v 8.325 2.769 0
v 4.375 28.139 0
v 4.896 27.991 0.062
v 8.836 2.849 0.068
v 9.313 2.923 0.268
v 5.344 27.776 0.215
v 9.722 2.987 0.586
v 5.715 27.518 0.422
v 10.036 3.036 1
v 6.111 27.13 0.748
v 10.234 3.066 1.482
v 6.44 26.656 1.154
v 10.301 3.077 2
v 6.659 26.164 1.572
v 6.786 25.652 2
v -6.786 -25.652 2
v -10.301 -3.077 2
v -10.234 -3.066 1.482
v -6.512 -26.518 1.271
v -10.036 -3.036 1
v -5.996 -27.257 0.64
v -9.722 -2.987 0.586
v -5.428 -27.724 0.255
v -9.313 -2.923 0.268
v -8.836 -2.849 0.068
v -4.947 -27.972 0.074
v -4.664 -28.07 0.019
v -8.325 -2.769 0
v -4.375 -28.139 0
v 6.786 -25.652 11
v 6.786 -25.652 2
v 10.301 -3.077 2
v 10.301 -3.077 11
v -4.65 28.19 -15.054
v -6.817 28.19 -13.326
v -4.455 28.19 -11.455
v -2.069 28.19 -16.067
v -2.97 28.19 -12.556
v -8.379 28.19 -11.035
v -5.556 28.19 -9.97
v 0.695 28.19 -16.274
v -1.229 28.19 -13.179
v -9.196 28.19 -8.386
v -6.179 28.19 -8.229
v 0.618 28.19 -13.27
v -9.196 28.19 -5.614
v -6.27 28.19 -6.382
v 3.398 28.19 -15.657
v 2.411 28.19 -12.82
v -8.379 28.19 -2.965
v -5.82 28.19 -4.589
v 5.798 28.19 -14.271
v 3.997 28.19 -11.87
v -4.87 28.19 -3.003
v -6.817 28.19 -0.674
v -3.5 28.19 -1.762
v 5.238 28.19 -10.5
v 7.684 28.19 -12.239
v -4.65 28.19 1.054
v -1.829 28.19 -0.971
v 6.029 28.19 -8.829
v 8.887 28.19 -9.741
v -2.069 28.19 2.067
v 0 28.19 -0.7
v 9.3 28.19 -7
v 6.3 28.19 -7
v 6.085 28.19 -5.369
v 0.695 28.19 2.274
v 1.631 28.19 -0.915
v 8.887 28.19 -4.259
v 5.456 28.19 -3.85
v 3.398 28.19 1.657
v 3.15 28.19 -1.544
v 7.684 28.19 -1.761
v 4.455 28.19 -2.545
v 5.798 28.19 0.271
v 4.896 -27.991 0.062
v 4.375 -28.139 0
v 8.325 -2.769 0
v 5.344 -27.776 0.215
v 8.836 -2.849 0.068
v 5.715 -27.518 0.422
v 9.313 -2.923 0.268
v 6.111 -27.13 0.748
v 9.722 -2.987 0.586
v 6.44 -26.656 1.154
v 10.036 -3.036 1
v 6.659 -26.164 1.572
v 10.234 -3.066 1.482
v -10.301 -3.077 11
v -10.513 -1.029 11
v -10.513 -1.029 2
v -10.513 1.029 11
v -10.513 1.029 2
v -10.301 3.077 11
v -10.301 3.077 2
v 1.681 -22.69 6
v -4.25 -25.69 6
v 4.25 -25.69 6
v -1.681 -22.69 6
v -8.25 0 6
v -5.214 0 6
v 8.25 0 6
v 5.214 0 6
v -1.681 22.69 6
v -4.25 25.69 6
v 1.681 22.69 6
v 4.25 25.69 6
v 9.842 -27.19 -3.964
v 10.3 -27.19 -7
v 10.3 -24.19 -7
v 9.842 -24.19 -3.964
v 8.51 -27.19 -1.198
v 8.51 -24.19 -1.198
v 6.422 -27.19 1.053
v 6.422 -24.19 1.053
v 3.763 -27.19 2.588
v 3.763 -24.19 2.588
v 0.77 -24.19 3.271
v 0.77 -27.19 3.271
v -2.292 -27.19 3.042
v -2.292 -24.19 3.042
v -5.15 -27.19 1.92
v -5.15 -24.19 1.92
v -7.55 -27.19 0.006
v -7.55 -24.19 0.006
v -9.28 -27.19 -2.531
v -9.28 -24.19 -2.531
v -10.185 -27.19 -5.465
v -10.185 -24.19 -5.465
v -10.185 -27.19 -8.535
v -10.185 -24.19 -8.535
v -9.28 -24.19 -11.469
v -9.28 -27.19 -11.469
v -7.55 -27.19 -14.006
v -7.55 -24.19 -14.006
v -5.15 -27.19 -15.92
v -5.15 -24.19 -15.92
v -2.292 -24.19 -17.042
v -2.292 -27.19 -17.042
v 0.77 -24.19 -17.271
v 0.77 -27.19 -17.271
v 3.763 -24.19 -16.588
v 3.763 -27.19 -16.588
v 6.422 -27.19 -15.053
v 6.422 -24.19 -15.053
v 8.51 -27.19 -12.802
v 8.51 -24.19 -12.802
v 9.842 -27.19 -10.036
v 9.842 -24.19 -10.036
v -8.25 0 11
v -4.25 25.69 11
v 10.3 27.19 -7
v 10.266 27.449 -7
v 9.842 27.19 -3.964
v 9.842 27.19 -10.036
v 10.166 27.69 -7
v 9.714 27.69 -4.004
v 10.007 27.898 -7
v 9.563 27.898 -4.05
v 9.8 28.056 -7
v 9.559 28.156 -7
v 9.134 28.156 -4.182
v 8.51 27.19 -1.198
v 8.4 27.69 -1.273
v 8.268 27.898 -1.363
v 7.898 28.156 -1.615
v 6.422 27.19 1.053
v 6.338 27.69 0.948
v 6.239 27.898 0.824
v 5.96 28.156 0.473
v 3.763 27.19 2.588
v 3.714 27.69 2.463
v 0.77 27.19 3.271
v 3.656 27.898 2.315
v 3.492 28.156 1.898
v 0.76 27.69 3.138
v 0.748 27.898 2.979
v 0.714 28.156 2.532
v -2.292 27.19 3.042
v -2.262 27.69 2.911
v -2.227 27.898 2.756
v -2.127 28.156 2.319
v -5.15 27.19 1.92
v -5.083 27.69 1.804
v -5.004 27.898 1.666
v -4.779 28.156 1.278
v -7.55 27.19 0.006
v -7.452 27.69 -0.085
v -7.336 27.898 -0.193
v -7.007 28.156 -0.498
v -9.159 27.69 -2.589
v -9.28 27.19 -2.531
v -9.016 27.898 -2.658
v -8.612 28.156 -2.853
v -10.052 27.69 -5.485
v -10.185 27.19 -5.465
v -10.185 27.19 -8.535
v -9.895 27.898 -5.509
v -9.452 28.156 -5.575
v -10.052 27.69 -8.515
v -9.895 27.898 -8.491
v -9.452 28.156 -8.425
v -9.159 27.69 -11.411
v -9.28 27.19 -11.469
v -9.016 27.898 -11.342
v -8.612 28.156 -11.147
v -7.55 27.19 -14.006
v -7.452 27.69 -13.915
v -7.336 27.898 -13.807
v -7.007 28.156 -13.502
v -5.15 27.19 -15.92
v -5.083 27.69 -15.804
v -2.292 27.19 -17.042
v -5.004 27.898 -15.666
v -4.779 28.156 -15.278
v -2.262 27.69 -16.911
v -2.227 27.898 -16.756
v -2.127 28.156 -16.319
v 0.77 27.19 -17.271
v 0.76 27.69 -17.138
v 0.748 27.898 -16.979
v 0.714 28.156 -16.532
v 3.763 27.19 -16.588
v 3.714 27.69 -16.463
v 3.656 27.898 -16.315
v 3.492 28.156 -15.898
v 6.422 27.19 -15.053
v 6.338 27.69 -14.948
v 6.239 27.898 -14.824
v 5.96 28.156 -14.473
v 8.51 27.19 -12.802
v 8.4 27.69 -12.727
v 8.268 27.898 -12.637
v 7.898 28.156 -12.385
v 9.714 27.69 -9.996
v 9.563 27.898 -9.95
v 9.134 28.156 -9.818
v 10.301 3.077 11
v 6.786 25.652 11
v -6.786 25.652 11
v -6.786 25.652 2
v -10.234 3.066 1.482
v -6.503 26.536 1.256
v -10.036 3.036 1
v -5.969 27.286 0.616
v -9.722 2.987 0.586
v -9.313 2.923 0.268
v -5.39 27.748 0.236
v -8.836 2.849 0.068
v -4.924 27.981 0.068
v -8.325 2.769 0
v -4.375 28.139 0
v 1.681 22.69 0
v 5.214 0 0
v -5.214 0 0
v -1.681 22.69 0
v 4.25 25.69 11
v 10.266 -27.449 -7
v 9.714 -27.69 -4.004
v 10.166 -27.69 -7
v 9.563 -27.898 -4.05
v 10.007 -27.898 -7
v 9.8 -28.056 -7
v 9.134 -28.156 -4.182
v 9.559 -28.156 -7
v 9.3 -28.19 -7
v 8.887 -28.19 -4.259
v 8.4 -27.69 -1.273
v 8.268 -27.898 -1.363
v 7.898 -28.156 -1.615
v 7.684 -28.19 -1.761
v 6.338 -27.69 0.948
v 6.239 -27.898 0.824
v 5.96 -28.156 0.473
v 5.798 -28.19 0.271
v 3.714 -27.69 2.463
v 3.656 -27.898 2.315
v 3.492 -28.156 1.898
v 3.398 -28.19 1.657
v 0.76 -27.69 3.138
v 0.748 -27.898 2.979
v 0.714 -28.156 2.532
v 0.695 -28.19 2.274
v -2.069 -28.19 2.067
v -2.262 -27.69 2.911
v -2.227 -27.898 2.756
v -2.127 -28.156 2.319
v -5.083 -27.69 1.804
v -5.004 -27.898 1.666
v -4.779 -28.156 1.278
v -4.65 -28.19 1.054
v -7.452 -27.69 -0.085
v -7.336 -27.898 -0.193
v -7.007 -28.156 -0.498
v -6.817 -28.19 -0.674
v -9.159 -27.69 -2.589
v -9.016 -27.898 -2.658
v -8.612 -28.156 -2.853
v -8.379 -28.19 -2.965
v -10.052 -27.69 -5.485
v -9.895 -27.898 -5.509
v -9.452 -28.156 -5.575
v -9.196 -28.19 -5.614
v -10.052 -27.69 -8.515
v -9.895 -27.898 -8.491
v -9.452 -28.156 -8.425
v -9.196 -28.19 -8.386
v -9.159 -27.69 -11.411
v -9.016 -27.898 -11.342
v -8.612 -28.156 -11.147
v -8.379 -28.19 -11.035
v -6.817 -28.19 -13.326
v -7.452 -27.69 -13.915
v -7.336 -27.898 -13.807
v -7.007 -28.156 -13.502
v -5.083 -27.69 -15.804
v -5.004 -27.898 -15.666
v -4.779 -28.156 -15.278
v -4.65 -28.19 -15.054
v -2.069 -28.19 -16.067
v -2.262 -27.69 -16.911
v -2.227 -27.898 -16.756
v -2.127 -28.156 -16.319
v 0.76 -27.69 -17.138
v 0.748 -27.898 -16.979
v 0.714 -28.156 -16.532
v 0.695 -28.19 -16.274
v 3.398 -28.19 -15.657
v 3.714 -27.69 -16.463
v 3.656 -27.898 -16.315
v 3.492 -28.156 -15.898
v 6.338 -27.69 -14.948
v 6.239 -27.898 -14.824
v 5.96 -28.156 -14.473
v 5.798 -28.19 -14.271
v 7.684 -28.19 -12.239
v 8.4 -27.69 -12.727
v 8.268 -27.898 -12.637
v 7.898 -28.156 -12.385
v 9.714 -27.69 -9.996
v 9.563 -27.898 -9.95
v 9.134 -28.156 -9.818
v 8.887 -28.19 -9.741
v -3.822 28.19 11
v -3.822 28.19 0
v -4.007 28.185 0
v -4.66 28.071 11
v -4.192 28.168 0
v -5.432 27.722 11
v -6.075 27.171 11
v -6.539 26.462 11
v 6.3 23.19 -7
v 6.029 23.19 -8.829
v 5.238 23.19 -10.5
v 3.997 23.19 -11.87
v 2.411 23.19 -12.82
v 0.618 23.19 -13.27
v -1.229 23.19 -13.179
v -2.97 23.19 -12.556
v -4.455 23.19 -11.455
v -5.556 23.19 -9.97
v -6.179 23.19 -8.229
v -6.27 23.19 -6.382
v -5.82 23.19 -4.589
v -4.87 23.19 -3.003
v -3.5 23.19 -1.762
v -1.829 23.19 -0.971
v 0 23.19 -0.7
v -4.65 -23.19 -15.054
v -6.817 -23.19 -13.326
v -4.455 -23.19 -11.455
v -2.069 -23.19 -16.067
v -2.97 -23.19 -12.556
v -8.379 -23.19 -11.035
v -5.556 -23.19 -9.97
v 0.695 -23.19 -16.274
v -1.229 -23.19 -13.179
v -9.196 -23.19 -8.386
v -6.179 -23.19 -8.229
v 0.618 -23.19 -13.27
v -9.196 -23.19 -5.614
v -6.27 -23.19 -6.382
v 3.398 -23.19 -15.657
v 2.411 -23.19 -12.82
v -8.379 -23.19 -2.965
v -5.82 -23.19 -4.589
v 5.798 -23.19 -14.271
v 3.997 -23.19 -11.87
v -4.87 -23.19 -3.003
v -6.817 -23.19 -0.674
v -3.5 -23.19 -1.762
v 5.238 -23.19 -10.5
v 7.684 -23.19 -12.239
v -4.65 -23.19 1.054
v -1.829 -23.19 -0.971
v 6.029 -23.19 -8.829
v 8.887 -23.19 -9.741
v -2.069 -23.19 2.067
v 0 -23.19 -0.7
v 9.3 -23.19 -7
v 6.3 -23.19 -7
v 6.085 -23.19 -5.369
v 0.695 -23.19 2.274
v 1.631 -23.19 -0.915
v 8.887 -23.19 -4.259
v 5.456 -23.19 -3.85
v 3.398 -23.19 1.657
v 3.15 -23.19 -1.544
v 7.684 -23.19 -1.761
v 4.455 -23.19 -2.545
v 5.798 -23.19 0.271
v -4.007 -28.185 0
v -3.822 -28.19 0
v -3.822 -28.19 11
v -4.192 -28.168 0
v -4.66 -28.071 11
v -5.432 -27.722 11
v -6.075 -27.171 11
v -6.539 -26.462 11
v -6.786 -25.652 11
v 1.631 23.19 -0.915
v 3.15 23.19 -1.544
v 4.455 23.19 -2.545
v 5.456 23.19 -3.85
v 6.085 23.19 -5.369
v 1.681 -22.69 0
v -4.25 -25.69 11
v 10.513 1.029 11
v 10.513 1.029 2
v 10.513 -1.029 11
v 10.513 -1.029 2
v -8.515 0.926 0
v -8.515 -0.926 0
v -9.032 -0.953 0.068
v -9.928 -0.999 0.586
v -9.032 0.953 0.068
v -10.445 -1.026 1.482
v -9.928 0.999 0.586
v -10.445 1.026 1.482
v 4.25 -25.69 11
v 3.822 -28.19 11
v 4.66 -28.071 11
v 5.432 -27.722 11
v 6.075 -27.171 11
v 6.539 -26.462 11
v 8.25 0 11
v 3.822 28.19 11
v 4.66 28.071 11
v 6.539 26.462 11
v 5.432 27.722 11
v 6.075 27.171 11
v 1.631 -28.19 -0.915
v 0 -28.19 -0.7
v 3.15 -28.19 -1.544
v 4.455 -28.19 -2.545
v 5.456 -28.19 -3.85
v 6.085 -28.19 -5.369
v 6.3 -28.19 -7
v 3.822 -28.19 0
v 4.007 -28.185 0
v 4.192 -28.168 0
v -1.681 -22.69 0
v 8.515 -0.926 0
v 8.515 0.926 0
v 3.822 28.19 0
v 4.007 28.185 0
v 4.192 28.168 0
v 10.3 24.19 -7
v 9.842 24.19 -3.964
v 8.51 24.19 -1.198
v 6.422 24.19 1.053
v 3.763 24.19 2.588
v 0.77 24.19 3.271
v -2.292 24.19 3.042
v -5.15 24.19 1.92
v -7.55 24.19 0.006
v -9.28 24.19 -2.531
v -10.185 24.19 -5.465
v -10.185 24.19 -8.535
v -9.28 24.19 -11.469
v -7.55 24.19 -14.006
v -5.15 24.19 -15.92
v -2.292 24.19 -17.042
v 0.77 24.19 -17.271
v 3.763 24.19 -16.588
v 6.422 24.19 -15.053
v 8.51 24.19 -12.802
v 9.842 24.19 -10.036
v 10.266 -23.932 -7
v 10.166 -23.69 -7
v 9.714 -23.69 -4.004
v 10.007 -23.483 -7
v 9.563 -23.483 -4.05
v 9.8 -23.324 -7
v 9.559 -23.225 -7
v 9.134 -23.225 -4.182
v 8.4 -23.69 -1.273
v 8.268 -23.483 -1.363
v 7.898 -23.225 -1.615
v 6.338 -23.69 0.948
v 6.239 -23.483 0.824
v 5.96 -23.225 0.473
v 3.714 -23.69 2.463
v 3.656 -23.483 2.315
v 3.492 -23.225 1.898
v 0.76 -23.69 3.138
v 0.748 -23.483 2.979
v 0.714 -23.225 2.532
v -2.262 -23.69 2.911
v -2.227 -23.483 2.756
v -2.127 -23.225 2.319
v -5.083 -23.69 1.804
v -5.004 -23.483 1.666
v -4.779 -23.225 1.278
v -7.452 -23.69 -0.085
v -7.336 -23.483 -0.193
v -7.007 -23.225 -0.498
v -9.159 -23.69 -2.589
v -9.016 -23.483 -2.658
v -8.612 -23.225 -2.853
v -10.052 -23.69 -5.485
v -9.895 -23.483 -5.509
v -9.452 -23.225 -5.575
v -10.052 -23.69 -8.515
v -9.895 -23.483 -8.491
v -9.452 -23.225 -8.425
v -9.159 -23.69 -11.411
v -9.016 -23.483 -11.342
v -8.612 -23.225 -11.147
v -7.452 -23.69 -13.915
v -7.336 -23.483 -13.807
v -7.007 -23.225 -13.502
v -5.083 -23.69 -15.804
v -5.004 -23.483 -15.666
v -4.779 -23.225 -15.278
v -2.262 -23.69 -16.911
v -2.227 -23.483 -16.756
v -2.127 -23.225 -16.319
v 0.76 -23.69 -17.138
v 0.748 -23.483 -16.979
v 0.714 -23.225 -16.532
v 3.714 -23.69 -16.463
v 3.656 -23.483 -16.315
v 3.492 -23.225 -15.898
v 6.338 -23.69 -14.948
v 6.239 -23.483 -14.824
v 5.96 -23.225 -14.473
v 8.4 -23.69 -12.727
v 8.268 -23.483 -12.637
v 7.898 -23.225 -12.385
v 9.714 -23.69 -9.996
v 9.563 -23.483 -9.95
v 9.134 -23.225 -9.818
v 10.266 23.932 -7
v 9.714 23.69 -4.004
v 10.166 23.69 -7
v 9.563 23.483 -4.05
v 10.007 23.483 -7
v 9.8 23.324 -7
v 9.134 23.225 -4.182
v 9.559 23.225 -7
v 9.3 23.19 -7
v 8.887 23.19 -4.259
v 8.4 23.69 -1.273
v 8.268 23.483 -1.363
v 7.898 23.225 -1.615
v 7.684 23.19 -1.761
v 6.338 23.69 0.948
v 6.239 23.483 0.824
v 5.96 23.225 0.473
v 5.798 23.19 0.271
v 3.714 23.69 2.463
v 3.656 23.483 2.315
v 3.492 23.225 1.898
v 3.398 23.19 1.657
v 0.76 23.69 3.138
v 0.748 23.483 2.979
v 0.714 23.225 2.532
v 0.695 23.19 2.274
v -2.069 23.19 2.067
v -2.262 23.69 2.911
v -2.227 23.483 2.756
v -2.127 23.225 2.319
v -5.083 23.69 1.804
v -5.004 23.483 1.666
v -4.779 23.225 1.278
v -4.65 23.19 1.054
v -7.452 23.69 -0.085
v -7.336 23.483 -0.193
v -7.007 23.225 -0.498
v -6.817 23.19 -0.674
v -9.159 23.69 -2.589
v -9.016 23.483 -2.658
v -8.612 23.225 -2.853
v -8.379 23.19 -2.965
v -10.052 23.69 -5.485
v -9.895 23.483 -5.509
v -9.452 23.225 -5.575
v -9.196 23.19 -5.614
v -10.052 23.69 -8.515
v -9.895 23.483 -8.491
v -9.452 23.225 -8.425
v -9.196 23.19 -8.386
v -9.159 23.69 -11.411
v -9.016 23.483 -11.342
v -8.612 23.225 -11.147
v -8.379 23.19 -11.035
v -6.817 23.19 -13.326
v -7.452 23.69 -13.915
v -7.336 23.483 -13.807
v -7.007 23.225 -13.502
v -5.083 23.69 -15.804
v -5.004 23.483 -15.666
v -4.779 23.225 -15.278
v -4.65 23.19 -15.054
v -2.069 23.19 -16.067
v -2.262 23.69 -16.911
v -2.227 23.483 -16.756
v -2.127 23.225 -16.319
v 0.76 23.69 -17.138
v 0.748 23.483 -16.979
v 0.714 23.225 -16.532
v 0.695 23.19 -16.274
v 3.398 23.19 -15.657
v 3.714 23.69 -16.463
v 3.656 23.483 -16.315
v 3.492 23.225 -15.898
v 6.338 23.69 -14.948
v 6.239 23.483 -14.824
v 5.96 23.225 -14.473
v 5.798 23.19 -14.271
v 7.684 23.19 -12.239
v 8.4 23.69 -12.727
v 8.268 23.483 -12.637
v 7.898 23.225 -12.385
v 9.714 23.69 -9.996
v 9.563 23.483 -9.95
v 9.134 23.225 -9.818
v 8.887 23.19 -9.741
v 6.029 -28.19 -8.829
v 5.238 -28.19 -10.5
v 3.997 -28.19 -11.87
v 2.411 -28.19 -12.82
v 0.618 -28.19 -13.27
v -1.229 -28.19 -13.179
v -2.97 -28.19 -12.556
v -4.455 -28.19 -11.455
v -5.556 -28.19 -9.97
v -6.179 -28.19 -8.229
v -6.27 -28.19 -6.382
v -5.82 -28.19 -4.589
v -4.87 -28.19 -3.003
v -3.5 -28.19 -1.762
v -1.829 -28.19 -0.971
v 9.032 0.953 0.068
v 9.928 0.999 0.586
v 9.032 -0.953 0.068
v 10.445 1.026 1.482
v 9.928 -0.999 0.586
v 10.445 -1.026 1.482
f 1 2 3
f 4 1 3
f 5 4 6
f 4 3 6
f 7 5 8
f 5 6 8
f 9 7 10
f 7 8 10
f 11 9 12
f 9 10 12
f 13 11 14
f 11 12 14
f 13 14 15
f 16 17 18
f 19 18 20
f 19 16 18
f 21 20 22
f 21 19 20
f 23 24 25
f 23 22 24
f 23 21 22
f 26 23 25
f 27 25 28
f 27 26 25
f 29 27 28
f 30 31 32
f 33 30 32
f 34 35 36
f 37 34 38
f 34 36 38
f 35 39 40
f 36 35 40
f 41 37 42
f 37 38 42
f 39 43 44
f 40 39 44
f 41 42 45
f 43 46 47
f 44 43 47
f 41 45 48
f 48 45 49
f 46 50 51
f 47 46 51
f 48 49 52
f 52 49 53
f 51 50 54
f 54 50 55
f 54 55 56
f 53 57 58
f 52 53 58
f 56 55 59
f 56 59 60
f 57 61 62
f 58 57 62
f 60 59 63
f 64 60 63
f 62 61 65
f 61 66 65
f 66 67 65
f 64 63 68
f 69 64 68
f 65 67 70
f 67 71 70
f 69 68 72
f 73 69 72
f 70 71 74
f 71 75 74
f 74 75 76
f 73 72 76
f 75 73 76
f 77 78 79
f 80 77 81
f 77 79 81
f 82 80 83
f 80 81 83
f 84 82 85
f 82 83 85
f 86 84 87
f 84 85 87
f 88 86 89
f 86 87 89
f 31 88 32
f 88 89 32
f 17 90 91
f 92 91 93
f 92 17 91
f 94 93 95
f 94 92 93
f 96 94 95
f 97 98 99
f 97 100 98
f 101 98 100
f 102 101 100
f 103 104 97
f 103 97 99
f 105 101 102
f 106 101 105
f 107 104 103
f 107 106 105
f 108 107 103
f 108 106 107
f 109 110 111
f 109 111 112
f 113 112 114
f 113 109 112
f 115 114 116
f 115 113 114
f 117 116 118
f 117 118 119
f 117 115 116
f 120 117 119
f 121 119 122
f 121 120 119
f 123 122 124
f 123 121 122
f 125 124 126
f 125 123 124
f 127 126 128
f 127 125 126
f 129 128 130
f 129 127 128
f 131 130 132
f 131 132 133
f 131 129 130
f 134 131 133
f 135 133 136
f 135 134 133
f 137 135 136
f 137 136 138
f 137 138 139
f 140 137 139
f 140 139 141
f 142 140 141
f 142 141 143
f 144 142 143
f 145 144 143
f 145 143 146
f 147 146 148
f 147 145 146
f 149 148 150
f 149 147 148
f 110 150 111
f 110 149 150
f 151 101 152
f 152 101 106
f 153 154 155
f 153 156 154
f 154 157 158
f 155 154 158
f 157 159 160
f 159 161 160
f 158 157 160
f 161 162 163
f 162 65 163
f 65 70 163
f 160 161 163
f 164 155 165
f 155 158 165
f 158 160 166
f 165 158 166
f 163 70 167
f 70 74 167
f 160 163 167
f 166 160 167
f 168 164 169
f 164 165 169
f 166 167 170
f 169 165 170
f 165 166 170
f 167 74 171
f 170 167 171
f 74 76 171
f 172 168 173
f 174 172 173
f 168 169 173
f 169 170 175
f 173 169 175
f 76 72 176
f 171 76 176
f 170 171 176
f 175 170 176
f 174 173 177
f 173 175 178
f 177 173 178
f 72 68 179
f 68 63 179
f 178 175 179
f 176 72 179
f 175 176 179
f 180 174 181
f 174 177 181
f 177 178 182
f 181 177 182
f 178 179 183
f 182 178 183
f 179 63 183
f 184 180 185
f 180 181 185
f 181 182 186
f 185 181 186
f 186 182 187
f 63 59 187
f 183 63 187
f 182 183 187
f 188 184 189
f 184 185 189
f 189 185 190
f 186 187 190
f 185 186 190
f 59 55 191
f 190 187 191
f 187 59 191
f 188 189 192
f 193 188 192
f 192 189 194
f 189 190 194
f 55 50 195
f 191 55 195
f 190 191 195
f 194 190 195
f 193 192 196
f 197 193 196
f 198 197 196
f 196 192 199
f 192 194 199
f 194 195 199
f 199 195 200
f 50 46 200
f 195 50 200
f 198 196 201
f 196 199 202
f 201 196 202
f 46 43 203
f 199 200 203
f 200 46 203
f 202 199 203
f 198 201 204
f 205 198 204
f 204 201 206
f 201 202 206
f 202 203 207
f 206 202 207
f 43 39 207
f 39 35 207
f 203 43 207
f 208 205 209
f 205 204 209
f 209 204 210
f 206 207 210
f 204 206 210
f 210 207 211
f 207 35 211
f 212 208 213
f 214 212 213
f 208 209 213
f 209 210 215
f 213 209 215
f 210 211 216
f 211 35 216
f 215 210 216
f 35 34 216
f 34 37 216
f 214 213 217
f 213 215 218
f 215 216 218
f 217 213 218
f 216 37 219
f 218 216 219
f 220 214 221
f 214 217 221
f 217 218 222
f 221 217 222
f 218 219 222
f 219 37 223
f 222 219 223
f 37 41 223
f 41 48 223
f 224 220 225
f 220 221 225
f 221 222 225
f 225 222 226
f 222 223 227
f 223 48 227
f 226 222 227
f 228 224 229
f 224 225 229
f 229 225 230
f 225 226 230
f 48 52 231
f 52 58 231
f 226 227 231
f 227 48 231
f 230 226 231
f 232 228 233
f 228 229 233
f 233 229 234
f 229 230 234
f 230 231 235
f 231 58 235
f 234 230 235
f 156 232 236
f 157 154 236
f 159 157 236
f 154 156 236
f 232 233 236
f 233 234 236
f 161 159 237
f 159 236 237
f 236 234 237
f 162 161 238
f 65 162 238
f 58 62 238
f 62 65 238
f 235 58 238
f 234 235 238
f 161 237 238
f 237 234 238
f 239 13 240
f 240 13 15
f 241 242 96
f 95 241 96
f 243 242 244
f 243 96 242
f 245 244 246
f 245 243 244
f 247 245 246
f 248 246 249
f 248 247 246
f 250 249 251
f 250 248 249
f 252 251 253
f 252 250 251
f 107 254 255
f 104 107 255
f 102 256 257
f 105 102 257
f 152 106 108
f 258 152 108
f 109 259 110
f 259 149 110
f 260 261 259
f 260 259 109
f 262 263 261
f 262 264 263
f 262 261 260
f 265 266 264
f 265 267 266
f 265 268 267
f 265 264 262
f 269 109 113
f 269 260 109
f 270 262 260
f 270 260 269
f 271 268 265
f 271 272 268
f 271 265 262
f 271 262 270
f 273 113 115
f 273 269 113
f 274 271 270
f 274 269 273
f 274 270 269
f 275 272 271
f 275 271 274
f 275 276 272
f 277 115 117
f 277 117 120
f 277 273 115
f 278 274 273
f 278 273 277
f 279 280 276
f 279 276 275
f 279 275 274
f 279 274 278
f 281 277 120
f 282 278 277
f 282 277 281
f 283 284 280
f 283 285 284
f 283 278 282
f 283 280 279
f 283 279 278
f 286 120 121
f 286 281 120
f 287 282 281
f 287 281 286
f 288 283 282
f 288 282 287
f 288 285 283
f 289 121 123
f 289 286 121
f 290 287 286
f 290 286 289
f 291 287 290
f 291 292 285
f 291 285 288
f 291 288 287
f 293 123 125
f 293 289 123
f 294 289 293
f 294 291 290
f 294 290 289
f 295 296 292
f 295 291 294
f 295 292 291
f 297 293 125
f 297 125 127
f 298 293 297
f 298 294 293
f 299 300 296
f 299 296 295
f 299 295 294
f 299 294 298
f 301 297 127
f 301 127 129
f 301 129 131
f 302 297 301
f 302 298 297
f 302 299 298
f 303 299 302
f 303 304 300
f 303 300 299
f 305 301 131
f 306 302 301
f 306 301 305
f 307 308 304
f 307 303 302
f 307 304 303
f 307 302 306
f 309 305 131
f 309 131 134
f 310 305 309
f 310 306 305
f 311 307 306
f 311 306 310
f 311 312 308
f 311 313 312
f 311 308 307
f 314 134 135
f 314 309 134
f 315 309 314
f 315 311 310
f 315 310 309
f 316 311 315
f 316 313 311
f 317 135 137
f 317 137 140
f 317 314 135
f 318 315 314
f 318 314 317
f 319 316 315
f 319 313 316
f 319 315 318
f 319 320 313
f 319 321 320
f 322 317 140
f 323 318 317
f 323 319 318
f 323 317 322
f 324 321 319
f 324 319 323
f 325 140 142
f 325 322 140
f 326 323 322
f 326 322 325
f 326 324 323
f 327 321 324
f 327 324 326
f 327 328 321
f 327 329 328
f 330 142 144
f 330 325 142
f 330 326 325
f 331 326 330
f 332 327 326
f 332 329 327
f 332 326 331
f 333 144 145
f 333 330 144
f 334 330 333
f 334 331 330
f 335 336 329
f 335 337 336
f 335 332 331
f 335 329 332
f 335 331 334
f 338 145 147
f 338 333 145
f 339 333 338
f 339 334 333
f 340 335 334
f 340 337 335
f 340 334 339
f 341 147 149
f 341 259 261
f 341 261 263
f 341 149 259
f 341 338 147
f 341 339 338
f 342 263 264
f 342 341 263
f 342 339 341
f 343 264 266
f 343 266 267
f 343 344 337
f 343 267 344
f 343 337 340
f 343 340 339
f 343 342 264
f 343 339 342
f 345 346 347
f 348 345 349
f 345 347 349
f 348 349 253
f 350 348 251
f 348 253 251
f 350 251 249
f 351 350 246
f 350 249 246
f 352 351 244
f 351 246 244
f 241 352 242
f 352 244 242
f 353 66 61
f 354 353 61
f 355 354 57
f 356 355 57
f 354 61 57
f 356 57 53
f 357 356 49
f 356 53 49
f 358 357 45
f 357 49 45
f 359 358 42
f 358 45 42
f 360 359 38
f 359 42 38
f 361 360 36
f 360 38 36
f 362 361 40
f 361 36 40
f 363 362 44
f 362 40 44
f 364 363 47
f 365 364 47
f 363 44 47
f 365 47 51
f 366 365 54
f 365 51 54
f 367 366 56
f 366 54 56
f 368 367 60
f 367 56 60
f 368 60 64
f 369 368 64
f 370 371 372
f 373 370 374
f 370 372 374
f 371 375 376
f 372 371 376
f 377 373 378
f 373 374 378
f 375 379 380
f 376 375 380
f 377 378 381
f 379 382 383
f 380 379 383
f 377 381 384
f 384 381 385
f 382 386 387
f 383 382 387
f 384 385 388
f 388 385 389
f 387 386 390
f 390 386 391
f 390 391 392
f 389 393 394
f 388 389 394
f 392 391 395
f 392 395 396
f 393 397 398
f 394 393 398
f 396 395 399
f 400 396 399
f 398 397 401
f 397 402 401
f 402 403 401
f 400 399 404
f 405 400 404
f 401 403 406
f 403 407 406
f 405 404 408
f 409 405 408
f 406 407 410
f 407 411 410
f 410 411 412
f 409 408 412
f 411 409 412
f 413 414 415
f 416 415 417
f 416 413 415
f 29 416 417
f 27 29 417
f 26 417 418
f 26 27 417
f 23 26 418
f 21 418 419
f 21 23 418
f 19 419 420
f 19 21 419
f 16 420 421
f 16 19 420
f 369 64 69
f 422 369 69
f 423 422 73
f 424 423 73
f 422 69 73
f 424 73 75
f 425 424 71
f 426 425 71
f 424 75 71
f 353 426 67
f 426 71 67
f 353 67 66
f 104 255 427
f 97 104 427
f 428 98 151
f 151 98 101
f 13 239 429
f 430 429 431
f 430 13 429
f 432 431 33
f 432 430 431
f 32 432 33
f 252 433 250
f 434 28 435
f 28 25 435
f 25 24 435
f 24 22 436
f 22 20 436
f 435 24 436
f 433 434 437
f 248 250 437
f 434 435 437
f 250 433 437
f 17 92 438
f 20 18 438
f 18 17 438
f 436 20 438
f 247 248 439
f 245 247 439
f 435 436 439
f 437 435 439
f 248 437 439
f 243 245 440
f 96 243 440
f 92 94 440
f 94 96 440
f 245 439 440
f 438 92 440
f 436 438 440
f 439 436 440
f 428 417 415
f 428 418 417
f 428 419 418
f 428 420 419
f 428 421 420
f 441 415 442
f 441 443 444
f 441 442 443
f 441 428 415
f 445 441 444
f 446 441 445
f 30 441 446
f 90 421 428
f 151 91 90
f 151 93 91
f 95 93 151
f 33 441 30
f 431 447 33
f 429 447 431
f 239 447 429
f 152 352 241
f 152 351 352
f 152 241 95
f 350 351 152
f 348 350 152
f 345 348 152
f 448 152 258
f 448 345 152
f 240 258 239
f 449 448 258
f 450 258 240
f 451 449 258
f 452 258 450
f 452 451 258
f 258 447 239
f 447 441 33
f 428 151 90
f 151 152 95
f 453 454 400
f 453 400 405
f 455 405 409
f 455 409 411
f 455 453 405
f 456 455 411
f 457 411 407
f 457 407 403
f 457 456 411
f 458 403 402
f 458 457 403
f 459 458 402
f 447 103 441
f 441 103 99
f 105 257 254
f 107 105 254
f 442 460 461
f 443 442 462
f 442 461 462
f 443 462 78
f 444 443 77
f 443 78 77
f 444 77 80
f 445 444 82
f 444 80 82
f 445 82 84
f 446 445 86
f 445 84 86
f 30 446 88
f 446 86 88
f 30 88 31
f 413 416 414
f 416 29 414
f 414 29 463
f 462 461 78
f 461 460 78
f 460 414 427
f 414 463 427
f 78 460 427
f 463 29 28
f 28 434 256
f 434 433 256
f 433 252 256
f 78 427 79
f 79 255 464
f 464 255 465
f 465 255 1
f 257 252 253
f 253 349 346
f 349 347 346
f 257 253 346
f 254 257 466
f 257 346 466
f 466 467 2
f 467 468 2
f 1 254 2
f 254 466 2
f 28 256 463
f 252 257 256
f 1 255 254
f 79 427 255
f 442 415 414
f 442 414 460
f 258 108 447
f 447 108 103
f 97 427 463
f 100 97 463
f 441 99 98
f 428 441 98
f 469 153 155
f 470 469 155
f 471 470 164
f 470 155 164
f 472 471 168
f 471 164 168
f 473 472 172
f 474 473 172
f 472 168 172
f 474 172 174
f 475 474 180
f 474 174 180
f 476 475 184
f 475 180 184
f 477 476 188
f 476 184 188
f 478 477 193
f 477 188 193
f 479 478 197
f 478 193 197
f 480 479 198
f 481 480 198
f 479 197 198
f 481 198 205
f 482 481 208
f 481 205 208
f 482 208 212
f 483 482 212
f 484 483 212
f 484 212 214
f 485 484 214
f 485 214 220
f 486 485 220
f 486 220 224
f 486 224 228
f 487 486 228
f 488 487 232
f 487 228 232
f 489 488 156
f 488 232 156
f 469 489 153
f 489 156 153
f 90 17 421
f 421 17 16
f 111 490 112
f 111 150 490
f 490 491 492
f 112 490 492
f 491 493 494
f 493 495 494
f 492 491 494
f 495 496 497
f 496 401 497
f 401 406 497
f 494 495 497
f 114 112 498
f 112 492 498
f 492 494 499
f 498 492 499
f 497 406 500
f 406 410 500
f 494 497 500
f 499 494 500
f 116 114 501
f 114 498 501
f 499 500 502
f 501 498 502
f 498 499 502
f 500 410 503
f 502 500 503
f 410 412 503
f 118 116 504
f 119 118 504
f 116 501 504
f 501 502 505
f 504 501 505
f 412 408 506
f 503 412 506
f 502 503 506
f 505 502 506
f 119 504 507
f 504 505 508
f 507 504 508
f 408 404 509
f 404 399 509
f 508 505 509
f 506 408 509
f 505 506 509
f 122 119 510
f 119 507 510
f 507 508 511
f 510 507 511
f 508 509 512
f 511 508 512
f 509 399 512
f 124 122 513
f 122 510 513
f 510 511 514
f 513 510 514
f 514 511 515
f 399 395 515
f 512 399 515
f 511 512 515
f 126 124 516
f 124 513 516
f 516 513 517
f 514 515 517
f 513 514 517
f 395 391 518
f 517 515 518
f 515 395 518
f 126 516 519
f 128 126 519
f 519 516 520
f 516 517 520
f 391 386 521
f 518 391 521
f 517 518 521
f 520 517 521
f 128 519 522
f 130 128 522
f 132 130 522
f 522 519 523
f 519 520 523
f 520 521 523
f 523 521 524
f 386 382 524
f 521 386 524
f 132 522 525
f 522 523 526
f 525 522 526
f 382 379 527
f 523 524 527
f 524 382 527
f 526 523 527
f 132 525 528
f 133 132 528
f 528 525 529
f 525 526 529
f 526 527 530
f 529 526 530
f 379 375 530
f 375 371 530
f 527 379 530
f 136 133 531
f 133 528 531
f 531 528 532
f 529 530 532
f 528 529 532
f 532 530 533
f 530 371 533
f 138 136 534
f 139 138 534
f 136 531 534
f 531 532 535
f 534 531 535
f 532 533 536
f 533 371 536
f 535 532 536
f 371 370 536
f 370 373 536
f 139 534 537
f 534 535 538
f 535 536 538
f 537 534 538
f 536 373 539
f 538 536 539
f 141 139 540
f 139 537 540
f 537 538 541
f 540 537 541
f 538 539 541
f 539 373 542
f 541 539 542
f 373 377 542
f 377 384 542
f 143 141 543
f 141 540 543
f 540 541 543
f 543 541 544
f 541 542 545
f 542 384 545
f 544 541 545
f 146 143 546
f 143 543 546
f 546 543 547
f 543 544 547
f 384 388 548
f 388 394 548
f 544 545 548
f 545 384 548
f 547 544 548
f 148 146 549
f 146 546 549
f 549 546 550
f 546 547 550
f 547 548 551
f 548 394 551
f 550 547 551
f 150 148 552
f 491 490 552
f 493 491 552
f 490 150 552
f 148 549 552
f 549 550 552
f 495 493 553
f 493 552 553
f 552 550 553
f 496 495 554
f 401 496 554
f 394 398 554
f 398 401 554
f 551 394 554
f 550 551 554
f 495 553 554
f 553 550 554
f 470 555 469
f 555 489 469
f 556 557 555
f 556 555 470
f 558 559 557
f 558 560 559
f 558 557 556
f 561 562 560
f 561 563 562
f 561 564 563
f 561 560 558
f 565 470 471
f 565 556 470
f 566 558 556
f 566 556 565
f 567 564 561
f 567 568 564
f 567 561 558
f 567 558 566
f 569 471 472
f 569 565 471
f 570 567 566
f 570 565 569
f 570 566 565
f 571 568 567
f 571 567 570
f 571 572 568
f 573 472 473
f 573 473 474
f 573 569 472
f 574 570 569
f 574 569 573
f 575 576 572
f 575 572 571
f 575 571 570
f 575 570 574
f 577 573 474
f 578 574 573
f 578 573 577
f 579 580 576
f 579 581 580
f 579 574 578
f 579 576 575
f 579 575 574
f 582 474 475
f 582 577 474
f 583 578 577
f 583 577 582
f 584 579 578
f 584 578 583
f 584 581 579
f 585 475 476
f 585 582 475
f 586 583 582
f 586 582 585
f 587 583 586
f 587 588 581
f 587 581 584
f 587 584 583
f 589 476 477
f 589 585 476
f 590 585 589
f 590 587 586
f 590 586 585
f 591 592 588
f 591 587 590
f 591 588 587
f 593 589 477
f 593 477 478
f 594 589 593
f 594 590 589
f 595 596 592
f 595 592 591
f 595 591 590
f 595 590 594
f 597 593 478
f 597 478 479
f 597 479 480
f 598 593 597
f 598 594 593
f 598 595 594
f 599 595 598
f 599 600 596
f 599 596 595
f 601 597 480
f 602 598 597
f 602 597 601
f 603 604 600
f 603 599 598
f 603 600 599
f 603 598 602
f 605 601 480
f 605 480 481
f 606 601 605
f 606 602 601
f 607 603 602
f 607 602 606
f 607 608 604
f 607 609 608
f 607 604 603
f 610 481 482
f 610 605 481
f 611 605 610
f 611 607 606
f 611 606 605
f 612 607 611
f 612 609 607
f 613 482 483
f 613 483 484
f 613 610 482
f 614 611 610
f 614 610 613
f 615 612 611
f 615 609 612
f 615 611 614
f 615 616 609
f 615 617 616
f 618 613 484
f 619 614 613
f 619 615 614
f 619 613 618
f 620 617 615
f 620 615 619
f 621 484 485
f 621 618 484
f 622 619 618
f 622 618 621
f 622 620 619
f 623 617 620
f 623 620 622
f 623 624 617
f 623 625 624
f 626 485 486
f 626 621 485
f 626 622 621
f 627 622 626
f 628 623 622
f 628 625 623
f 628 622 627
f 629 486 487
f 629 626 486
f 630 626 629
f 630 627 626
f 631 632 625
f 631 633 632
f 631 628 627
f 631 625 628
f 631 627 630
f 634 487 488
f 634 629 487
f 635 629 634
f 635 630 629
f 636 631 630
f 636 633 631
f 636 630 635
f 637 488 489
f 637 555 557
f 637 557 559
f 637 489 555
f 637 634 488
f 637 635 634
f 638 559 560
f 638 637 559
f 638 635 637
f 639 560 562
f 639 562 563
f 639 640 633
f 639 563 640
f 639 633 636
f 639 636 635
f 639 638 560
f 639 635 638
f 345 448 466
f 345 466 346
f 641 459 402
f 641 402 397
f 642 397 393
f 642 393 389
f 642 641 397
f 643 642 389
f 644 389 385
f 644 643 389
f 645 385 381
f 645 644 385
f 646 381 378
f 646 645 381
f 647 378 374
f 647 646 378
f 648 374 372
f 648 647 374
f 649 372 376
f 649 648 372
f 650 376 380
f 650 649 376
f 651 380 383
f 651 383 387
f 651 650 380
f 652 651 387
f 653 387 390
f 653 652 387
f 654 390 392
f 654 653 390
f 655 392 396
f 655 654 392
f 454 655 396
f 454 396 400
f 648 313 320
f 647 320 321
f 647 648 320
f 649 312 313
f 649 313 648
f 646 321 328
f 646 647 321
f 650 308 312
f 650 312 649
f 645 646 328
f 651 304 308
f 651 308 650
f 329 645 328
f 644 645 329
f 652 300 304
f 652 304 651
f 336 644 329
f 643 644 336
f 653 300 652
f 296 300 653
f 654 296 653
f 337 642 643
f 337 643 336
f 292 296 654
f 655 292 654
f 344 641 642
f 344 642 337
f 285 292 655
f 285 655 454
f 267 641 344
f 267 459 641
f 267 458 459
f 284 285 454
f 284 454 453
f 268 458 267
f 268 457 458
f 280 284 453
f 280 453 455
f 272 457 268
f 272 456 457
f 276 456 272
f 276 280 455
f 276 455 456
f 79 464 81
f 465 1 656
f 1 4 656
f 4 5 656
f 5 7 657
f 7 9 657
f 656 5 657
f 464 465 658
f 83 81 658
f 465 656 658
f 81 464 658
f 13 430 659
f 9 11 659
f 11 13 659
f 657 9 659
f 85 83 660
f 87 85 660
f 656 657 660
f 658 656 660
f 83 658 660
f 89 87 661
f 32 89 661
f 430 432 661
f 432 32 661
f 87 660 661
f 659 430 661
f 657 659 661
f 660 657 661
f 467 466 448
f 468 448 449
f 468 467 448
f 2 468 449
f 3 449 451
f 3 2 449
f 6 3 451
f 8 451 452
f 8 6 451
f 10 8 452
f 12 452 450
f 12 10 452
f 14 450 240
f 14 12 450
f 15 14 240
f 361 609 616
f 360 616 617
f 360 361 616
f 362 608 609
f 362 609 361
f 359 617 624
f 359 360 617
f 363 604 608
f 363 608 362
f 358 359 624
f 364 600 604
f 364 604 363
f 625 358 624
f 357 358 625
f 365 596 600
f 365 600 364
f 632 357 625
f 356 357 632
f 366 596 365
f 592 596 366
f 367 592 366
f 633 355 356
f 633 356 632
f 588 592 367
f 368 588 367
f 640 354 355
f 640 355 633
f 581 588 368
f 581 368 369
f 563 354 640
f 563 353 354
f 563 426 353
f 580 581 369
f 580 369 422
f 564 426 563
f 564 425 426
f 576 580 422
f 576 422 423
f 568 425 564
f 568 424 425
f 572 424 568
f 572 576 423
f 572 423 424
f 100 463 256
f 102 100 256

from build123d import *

# Parameters (mm, degrees)
F1_DEPTH     = 6
F2_DEPTH     = 11
F3_R         = 10.3
F4_DEPTH     = 5
F8_R         = 2
F9_R         = 1
F9_2_R       = 1
F10_T1_DEPTH = 21.8452325787
F11_T1_DEPTH = 18.7849894416
F11_T4_ANGLE = 17.6997661969
F11_T6_ANGLE = 17.6997661969


# Not quite as in the source:
# - a fillet or chamfer that OpenCascade refuses, or shapes differently, is made with other operations: its cross-section is extruded or revolved along the edge and cut away or added


with BuildPart() as f1:
    # F0 (on Top) → F1 (new body)
    with BuildSketch(Plane.XY):
        Polygon((4.25, -25.6904651573), (8.25, 0), (4.25, 25.6904651573), (0, 25.6904651573), (-4.25, 25.6904651573), (-8.25, 0), (-4.25, -25.6904651573), (0, -25.6904651573), align=None)
        Polygon((0, 22.6904651573), (1.6809534843, 22.6904651573), (5.2138541178, 0), (1.6809534843, -22.6904651573), (0, -22.6904651573), (-1.6809534843, -22.6904651573), (-5.2138541178, 0), (-1.6809534843, 22.6904651573), align=None, mode=Mode.SUBTRACT)
    extrude(amount=F1_DEPTH)

    # F0 (on Top) → F2 (join)
    with BuildSketch(Plane.XY):
        Polygon((-6.3908720964, 28.1904651573), (-10.7801215685, 0), (-6.3908720964, -28.1904651573), (0, -28.1904651573), (6.3908720964, -28.1904651573), (10.7801215685, 0), (6.3908720964, 28.1904651573), (0, 28.1904651573), align=None)
        Polygon((4.25, 25.6904651573), (8.25, 0), (4.25, -25.6904651573), (0, -25.6904651573), (-4.25, -25.6904651573), (-8.25, 0), (-4.25, 25.6904651573), (0, 25.6904651573), align=None, mode=Mode.SUBTRACT)
    extrude(amount=F2_DEPTH)

    # F8
    f8_edges = [f1.edges().sort_by_distance(p)[0] for p in [
        (-8.585497, -14.095233, 0),
        (-8.585497, 14.095233, 0),
        (8.585497, 14.095233, 0),
        (8.585497, -14.095233, 0),
    ]]
    fillet(f8_edges, radius=F8_R)

    # F10: fillet of radius 3 on 4 edges, made by hand

    # F10_s2 → F10_t1 (cut)
    with BuildSketch(Plane.XY.offset(-4.4226162893)):
        with BuildLine():
            ThreePointArc((-3.8218255807, -28.1904651573), (-5.7731564875, -27.4691287333), (-6.7861100219, -25.6520036189))
            Line((-6.7861100219, -25.6520036189), (-6.3908720964, -28.1904651573))
            Line((-6.3908720964, -28.1904651573), (-3.8218255807, -28.1904651573))
        make_face()
        with BuildLine():
            ThreePointArc((3.8218255807, -28.1904651573), (5.7731564875, -27.4691287333), (6.7861100219, -25.6520036189))
            Line((6.7861100219, -25.6520036189), (6.3908720964, -28.1904651573))
            Line((6.3908720964, -28.1904651573), (3.8218255807, -28.1904651573))
        make_face()
        with BuildLine():
            ThreePointArc((-3.8218255807, 28.1904651573), (-5.7731564875, 27.4691287333), (-6.7861100219, 25.6520036189))
            Line((-6.7861100219, 25.6520036189), (-6.3908720964, 28.1904651573))
            Line((-6.3908720964, 28.1904651573), (-3.8218255807, 28.1904651573))
        make_face()
        with BuildLine():
            ThreePointArc((3.8218255807, 28.1904651573), (5.7731564875, 27.4691287333), (6.7861100219, 25.6520036189))
            Line((6.7861100219, 25.6520036189), (6.3908720964, 28.1904651573))
            Line((6.3908720964, 28.1904651573), (3.8218255807, 28.1904651573))
        make_face()
    extrude(amount=F10_T1_DEPTH, mode=Mode.SUBTRACT)

    # F11: fillet of radius 20 on 2 edges, made by hand

    # F11_s2 → F11_t1 (cut)
    with BuildSketch(Plane.XY):
        with BuildLine():
            ThreePointArc((-10.3010452952, -3.0769230769), (-10.5391490203, 0), (-10.3010452952, 3.0769230769))
            Line((-10.3010452952, 3.0769230769), (-10.7801215685, 0))
            Line((-10.7801215685, 0), (-10.3010452952, -3.0769230769))
        make_face()
        with BuildLine():
            ThreePointArc((10.3010452952, 3.0769230769), (10.5391490203, 0), (10.3010452952, -3.0769230769))
            Line((10.3010452952, -3.0769230769), (10.7801215685, 0))
            Line((10.7801215685, 0), (10.3010452952, 3.0769230769))
        make_face()
    extrude(amount=F11_T1_DEPTH, mode=Mode.SUBTRACT)

    # F11_s3 → F11_t4 (revolve, cut)
    with BuildSketch(Plane(origin=(-0.223925467, 1.4381873518, 0), x_dir=(0, 0, 1), z_dir=(-0.1538461538, 0.9880948137, 0))):
        with BuildLine():
            ThreePointArc((0, 8.6517822134), (0.5857864376, 10.0659957758), (2, 10.6517822134))
            Line((2, 10.6517822134), (0, 10.6517822134))
            Line((0, 10.6517822134), (0, 8.6517822134))
        make_face()
    revolve(axis=Axis((-9.4608509797, 0, 0), (0, 0, -1)), revolution_arc=F11_T4_ANGLE, mode=Mode.SUBTRACT)

    # F11_s5 → F11_t6 (revolve, cut)
    with BuildSketch(Plane(origin=(0.223925467, -1.4381873518, 0), x_dir=(0, 0, 1), z_dir=(0.1538461538, -0.9880948137, 0))):
        with BuildLine():
            ThreePointArc((0, 8.6517822134), (0.5857864376, 10.0659957758), (2, 10.6517822134))
            Line((2, 10.6517822134), (0, 10.6517822134))
            Line((0, 10.6517822134), (0, 8.6517822134))
        make_face()
    revolve(axis=Axis((9.4608509797, 0, 0), (0, 0, -1)), revolution_arc=F11_T6_ANGLE, mode=Mode.SUBTRACT)


with BuildPart() as f4:
    # F3 (on face) → F4 (new body)
    with BuildSketch(Plane.XZ.offset(28.1904651573)):
        with Locations((0, -7)):
            Circle(F3_R)
        with BuildLine():
            ThreePointArc((0, -0.7), (4.4547727215, -2.5452272785), (6.3, -7))
            ThreePointArc((6.3, -7), (-4.4547727215, -11.4547727215), (0, -0.7))
        make_face(mode=Mode.SUBTRACT)
    extrude(amount=-F4_DEPTH)


with BuildPart() as f7_1:
    # F7: instance of F4
    add(f4.part.mirror(Plane(origin=(0, 0, -12.5), x_dir=(-1, 0, 0), z_dir=(0, -1, 0))))

    # F9#2
    f9_2_edges = [f7_1.edges().sort_by_distance(p)[0] for p in [
        (-10.3, 28.190465, -7),
        (-10.3, 23.190465, -7),
    ]]
    fillet(f9_2_edges, radius=F9_2_R)


with BuildPart() as f4_1:
    add(f4.part)

    # F9
    f9_edges = [f4_1.edges().sort_by_distance(p)[0] for p in [
        (-10.3, -28.190465, -7),
        (-10.3, -23.190465, -7),
    ]]
    fillet(f9_edges, radius=F9_R)


solid = Compound([f1.part, f7_1.part, f4_1.part])
